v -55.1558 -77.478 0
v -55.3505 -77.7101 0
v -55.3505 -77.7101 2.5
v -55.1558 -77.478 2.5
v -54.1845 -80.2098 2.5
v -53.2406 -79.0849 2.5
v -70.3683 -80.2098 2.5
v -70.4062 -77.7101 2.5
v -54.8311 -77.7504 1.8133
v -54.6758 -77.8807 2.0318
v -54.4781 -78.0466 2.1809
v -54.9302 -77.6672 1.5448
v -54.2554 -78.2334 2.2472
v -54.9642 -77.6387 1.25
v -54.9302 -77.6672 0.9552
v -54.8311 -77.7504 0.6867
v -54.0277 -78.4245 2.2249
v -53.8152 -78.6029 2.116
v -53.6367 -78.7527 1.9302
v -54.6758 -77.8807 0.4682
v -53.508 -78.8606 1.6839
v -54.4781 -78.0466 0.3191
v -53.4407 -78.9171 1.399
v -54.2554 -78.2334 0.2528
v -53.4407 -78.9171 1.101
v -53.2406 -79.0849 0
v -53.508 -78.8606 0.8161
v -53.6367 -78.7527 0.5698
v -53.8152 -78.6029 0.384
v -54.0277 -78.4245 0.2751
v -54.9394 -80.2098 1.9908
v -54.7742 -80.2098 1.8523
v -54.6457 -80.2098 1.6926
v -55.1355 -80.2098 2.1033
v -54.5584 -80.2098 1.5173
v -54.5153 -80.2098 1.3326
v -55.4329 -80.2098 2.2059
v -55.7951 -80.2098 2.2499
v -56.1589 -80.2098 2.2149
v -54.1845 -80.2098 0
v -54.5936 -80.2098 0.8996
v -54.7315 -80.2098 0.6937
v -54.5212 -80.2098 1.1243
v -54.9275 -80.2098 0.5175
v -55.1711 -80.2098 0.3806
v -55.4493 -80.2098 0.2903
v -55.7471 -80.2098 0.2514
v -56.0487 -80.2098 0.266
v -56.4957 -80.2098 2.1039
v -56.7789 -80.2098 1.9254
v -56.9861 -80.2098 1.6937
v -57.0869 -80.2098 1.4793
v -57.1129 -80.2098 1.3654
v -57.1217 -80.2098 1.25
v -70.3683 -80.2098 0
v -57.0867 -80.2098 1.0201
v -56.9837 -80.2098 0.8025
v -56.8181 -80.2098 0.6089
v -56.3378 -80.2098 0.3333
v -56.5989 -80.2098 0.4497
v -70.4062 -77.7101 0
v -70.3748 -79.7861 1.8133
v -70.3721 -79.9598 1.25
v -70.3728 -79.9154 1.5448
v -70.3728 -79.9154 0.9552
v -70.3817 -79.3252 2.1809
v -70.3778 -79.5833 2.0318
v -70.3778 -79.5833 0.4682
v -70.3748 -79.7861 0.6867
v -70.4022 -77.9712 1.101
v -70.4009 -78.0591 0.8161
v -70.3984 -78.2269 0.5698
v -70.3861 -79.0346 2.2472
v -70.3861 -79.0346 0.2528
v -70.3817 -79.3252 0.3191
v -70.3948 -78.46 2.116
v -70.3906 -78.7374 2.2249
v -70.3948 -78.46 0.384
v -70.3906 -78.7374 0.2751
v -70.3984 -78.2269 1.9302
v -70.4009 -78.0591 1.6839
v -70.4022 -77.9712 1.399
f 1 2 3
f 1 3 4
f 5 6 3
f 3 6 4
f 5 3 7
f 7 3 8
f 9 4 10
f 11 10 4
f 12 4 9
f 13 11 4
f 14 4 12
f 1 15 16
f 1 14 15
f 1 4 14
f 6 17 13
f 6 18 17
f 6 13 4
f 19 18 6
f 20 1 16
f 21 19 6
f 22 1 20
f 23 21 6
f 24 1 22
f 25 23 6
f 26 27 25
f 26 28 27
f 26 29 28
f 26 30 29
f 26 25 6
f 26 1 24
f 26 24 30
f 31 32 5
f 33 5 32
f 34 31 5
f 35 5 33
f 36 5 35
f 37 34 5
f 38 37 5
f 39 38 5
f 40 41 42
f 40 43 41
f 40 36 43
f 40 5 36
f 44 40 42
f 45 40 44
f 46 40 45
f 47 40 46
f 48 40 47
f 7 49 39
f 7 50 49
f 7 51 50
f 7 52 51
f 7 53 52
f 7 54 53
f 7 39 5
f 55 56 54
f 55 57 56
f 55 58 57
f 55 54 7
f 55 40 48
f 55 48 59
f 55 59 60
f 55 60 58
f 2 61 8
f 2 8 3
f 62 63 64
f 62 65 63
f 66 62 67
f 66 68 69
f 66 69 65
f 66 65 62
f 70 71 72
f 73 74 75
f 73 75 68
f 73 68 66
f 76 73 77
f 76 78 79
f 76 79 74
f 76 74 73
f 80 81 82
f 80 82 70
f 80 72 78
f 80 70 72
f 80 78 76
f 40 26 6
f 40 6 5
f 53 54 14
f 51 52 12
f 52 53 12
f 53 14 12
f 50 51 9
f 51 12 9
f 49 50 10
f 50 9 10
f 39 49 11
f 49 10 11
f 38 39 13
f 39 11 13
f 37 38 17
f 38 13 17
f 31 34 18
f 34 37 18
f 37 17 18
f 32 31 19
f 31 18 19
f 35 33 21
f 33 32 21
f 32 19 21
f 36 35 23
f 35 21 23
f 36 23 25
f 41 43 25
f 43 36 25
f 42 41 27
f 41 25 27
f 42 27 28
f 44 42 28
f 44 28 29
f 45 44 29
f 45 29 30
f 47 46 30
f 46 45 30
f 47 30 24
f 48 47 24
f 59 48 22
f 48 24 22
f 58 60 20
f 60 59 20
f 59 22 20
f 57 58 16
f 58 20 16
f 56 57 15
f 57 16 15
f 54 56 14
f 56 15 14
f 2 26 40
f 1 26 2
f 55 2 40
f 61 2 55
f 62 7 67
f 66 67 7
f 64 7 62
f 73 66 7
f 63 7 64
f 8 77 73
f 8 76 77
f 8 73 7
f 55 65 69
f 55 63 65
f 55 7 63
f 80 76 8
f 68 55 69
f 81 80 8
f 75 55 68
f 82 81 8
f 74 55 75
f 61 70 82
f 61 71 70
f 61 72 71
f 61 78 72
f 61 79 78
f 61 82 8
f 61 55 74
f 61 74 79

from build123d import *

# Parameters (mm, degrees)
BOSS_EXTRUDE1_DEPTH = 2.5
SKETCH2_R           = 1
CUT_EXTRUDE1_DEPTH  = 4.5
SKETCH3_R           = 1
CUT_EXTRUDE2_DEPTH  = 9.5
SKETCH5_R           = 1
BOSS_EXTRUDE2_DEPTH = 9.5


with BuildPart() as part:
    # Sketch1 → Boss-Extrude1 (new body)
    with BuildSketch(Plane.XY):
        Polygon((-70.406172668, -77.710060133), (-55.350496572, -77.710060133), (-55.155758053, -77.477979804), (-53.240646945, -79.084948828), (-54.184487309, -80.209773972), (-70.368347793, -80.209773972), align=None)
    extrude(amount=BOSS_EXTRUDE1_DEPTH)

    # Sketch2 → Cut-Extrude1 (cut)
    with BuildSketch(Plane(origin=(-60.939488189, -72.62485398, 0), x_dir=(0, 0, -1), z_dir=(0.6427876096865354, 0.7660444431189815, 0))):
        with Locations(Location((-1.25, -8.800123479, 0), (0, 0, 90))):
            Circle(SKETCH2_R)
    extrude(amount=-CUT_EXTRUDE1_DEPTH, mode=Mode.SUBTRACT)

    # Sketch3 → Cut-Extrude2 (cut)
    with BuildSketch(Plane(origin=(-71.565670343, -1.082908957, 0), x_dir=(0, 0, 1), z_dir=(-0.9998855357578961, -0.015129949839474953, 0))):
        with Locations(Location((1.25, -77.885923249, 0), (0, 0, 270))):
            Circle(SKETCH3_R)
    extrude(amount=-CUT_EXTRUDE2_DEPTH, mode=Mode.SUBTRACT)

    # Sketch5 → Boss-Extrude2 (add)
    with BuildSketch(Plane(origin=(-71.565670343, -1.082908957, 0), x_dir=(0, 0, 1), z_dir=(-0.9998855357578961, -0.015129949839476386, 0))):
        with Locations((1.25, -77.885923249)):
            Circle(SKETCH5_R)
    extrude(amount=-BOSS_EXTRUDE2_DEPTH)


solid = part.part
